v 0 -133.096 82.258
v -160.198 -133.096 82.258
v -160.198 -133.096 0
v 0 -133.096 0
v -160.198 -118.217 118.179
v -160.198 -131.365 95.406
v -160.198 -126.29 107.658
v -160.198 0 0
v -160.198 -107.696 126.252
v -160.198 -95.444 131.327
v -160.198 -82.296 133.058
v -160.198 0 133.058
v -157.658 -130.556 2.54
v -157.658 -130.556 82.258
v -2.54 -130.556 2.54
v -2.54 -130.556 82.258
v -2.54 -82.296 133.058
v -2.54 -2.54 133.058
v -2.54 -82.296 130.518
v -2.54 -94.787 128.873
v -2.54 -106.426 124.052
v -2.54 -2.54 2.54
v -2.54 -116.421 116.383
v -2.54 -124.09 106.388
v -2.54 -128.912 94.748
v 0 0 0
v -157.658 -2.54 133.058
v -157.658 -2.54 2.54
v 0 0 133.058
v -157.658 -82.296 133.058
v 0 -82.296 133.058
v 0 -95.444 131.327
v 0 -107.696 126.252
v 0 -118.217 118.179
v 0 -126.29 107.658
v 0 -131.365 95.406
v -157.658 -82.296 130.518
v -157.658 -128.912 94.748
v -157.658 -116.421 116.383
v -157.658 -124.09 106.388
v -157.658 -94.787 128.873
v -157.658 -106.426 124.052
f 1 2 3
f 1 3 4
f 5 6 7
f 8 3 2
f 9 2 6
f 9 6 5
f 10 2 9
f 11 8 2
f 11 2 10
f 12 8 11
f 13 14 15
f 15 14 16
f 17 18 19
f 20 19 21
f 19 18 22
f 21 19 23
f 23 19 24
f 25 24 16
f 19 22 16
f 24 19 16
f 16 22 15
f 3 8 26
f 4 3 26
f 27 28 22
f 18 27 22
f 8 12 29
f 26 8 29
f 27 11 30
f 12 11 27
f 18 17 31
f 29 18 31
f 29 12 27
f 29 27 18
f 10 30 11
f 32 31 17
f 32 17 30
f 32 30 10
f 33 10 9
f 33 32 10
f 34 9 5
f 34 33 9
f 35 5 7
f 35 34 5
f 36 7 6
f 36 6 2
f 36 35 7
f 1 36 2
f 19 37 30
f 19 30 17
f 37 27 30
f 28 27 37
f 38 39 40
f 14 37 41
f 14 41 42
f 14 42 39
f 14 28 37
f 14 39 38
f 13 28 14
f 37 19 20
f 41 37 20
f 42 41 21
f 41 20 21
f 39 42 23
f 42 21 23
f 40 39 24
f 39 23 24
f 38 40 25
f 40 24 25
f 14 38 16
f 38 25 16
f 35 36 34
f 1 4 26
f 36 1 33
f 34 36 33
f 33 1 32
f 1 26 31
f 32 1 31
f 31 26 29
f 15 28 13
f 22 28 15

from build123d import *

# Parameters (mm, degrees)
F0_W     = 160.1980030537
F0_H     = 133.0576241016
F1_DEPTH = 133.096
F2_R     = 50.8
F3_T     = -2.54


# Not quite as in the source:
# - a shell that OpenCascade refuses in one call is made with other operations: the cavity is built on its own and cut out


with BuildPart() as f1:
    # F0 (on Front) → F1 (new body)
    with BuildSketch(Plane.XZ):
        with Locations((-80.0990015268, 66.5288120508)):
            Rectangle(F0_W, F0_H)
    extrude(amount=F1_DEPTH)

    # F2
    f2_edges = [f1.edges().sort_by_distance(p)[0] for p in [
        (-80.099002, -133.096, 133.057624),
    ]]
    fillet(f2_edges, radius=F2_R)

    # F3: a shell. OpenCascade refuses it in one call, so the cavity is built on its own and cut out:
    # the body offset inwards by the wall thickness, plus a prism from it out through each open face.
    f3_core = offset(f1.part, amount=F3_T, mode=Mode.PRIVATE)
    f3_exits = [f3_core.faces().sort_by_distance(p)[0] for p in [
        (-80.099002, -42.418, 130.517624),
    ]]
    add(f3_core, mode=Mode.SUBTRACT)
    extrude(f3_exits, amount=-F3_T, mode=Mode.SUBTRACT)


solid = f1.part
